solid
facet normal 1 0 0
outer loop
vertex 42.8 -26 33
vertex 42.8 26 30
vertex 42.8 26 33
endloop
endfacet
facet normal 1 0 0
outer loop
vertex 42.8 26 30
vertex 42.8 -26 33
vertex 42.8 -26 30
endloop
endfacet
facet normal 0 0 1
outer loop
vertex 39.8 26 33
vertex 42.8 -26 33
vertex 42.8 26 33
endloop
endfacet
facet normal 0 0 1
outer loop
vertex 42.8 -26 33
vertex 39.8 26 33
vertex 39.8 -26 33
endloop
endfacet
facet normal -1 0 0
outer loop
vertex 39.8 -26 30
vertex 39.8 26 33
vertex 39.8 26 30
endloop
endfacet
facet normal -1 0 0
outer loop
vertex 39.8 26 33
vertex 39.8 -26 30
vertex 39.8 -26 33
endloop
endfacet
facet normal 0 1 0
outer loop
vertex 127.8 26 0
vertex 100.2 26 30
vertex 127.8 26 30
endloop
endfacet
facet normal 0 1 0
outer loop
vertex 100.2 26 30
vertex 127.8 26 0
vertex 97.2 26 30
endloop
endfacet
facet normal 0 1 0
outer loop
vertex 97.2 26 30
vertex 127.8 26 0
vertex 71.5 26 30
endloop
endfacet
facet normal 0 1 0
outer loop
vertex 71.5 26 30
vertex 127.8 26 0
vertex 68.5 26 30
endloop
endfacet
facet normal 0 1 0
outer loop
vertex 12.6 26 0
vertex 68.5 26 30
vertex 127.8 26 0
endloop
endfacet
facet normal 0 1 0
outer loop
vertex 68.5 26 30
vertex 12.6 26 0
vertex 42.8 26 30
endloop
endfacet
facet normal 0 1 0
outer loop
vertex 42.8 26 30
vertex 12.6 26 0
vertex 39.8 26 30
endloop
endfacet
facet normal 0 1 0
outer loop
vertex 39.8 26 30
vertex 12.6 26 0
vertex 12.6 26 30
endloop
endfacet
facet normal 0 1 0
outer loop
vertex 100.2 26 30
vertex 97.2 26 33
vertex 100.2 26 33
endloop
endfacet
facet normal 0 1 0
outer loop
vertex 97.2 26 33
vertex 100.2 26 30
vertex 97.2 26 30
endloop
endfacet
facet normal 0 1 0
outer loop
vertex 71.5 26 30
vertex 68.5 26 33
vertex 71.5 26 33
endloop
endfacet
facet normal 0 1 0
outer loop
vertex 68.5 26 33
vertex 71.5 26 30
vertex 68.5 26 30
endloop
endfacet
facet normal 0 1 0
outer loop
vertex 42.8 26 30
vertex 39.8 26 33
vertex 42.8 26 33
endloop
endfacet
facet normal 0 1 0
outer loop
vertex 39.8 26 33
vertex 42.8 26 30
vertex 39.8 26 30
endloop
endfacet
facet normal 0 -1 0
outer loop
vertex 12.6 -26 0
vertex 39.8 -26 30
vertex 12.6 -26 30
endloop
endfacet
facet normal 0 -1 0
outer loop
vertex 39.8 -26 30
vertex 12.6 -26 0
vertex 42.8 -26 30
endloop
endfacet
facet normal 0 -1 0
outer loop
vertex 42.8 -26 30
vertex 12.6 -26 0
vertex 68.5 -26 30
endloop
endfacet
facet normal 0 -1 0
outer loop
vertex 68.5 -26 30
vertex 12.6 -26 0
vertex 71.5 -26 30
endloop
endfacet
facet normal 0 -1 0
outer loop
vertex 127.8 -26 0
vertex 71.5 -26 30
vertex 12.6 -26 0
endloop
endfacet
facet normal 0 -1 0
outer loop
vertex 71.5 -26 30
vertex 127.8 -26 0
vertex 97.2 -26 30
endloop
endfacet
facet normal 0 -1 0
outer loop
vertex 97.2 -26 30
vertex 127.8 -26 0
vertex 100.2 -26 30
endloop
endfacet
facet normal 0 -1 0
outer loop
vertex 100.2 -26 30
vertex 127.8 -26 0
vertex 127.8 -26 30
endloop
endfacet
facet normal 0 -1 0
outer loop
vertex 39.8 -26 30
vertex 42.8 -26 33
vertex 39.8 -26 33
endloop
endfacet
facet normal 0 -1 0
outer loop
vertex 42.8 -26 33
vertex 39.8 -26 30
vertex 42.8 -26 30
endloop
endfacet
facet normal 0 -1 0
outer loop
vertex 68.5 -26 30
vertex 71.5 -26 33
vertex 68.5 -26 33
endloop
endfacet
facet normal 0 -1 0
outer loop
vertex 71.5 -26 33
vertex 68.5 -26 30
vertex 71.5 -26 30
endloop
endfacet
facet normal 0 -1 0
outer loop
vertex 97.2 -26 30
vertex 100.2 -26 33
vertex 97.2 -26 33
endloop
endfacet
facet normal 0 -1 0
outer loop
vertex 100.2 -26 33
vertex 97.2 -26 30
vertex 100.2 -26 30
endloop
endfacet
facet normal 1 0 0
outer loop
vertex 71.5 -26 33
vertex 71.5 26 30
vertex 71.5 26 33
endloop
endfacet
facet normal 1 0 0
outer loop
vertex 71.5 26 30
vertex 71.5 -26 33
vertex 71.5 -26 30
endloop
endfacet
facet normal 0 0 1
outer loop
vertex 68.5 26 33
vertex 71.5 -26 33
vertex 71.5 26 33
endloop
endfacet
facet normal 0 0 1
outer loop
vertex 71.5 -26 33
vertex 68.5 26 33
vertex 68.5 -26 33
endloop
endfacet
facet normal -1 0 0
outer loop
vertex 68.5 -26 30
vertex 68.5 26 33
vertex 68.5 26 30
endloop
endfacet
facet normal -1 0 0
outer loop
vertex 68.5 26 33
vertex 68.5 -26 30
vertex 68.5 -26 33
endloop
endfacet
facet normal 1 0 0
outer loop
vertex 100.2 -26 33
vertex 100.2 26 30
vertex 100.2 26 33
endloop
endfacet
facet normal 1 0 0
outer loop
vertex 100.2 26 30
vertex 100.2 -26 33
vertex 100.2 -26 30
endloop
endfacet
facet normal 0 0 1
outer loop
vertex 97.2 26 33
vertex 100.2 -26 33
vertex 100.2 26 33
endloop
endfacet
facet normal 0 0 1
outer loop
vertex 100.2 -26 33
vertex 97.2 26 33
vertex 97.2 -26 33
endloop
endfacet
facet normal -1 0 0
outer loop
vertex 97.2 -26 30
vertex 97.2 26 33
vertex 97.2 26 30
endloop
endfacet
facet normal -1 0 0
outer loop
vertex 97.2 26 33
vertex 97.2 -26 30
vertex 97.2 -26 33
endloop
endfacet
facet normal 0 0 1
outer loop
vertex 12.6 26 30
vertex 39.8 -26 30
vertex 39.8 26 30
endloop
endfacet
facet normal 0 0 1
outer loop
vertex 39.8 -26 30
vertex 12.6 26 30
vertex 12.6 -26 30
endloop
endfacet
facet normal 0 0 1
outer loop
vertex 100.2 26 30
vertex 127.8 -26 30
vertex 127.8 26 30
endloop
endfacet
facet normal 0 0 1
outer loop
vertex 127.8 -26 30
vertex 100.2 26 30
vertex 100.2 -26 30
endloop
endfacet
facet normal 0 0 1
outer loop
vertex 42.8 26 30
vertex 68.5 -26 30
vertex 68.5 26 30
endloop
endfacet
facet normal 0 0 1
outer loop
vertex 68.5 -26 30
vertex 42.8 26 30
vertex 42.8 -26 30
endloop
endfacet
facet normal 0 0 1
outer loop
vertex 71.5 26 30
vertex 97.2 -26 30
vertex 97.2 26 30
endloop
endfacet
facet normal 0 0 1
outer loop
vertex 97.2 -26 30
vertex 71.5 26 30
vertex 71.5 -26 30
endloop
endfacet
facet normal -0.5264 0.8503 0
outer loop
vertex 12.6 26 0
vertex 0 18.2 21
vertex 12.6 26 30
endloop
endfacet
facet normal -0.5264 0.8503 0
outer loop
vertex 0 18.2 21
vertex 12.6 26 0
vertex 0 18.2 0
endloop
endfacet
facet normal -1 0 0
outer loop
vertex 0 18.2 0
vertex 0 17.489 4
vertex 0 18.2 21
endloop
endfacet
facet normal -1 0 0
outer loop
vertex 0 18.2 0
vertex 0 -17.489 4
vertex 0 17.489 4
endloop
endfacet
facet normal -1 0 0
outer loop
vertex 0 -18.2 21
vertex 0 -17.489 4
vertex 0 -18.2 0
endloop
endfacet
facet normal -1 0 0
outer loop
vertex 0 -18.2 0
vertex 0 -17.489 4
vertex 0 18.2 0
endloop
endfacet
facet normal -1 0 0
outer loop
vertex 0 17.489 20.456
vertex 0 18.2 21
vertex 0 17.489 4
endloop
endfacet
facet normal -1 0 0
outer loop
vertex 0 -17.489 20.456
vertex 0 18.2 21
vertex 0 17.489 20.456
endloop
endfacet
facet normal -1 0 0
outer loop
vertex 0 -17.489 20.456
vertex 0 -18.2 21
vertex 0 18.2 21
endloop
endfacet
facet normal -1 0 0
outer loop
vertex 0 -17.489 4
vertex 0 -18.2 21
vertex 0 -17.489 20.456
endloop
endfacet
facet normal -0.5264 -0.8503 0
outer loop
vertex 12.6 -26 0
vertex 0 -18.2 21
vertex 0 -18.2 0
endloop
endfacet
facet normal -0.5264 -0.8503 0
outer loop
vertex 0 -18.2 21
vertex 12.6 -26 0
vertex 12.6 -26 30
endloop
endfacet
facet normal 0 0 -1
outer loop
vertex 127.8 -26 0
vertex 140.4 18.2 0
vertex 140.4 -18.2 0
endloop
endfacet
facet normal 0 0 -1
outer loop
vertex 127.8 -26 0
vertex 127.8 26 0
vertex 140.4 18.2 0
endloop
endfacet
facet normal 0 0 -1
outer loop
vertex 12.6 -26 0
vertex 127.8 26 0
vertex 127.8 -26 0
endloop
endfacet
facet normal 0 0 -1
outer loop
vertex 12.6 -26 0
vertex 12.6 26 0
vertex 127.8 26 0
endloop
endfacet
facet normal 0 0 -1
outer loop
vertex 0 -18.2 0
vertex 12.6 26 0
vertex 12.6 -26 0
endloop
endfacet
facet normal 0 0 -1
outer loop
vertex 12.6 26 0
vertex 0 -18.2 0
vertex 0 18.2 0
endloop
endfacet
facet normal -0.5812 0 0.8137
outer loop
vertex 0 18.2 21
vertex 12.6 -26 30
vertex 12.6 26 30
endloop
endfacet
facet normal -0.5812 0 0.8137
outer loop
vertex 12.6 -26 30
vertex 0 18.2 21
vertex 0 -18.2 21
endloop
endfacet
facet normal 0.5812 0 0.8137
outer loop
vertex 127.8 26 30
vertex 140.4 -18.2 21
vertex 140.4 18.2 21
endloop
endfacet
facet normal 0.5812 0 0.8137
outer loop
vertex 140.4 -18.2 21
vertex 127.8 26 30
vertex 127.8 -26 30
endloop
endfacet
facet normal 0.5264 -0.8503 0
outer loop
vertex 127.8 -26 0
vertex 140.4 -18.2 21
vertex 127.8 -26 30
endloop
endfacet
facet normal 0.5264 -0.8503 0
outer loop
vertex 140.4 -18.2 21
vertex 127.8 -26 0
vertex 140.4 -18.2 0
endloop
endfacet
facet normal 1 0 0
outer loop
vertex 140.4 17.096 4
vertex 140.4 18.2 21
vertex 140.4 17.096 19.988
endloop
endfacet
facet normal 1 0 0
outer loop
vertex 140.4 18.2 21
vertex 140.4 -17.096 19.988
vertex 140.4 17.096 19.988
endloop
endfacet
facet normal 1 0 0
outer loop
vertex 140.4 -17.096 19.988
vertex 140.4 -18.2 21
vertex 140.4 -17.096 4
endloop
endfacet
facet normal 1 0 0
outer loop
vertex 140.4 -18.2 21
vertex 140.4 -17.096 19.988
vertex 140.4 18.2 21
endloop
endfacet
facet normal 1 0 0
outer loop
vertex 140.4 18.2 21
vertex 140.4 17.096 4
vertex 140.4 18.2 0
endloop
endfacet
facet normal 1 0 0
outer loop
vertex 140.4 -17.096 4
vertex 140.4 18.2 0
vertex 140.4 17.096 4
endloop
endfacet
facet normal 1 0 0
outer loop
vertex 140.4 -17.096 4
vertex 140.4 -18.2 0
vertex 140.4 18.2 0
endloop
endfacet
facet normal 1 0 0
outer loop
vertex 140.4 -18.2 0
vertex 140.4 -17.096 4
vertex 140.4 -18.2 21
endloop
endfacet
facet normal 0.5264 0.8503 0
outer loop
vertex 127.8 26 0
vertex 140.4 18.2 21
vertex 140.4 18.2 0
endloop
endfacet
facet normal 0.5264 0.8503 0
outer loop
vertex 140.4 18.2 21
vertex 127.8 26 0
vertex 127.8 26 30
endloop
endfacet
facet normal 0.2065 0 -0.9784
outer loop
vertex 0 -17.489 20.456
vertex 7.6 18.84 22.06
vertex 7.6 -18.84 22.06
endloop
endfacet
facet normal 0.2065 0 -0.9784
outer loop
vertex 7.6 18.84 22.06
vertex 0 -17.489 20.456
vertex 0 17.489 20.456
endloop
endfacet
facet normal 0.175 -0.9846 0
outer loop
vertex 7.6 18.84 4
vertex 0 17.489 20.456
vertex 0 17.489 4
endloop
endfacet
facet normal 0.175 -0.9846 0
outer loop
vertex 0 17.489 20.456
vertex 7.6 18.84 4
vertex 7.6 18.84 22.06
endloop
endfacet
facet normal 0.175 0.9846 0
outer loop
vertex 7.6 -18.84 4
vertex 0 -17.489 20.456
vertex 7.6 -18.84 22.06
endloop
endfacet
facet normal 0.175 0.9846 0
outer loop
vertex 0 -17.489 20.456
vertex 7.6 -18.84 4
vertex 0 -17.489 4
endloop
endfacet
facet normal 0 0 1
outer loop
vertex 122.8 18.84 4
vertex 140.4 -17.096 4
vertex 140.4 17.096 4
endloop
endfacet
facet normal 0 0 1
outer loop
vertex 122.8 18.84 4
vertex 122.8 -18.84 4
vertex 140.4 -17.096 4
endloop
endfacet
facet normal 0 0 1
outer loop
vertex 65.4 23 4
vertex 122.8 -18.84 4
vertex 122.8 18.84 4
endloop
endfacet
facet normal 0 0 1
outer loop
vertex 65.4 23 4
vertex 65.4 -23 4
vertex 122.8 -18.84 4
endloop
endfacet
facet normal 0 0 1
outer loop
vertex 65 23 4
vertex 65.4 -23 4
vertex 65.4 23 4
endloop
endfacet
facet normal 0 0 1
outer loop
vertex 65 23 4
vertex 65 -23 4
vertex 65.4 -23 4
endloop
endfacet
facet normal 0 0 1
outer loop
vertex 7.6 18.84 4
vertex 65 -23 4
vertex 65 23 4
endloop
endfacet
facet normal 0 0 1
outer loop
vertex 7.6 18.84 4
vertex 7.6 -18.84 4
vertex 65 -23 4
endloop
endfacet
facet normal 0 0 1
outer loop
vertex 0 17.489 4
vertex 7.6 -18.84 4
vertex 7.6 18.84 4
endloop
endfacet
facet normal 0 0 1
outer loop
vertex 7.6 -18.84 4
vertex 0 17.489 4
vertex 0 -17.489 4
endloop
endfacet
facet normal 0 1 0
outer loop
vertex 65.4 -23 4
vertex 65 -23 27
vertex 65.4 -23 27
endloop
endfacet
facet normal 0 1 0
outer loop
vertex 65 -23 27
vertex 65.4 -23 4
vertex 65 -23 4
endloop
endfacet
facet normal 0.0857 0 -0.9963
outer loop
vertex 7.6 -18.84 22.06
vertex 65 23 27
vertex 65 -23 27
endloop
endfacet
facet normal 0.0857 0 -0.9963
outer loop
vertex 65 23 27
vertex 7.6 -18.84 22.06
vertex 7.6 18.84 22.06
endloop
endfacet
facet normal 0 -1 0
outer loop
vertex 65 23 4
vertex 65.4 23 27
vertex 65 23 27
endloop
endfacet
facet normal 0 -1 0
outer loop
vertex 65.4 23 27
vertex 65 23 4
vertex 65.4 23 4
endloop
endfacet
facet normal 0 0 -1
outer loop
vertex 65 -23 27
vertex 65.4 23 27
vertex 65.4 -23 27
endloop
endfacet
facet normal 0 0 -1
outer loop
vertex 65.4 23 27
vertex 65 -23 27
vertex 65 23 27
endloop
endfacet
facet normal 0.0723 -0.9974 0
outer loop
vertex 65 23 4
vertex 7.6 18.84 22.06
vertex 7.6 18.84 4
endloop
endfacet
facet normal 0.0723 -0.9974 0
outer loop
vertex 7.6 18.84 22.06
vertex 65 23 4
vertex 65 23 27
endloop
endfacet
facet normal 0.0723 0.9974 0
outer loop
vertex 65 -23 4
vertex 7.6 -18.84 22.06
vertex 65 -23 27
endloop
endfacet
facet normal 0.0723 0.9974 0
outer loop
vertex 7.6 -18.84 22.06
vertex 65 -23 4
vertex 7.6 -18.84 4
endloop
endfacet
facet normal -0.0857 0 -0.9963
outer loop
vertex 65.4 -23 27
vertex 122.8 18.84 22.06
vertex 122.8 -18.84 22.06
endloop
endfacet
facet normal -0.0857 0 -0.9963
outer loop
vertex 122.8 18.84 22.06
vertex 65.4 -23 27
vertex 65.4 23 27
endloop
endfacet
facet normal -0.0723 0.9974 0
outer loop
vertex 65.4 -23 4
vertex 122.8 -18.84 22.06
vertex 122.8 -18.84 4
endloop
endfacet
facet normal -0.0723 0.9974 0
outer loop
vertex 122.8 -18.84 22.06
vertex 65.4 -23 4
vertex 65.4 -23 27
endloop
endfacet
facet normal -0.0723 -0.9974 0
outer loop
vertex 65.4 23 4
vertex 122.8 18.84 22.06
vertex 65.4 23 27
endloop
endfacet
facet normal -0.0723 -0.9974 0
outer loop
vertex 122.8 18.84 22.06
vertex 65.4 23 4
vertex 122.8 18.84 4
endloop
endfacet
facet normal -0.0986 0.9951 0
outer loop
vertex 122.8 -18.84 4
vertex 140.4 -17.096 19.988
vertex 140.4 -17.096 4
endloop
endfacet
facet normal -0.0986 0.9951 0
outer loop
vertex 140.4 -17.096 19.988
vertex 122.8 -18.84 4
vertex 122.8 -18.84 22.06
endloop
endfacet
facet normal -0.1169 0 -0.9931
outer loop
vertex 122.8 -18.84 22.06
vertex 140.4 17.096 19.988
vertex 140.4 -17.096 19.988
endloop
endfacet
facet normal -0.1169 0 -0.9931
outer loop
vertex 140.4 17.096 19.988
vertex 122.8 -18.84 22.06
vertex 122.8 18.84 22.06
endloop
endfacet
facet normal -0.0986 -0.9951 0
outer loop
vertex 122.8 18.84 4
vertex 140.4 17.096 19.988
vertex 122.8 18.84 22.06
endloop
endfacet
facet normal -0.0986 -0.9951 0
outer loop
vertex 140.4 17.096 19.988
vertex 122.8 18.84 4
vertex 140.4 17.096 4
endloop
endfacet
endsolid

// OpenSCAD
$fn = 32;

// ----------------------------------------------------------------------
// Faired channel: 140 x 52 x 30 mm, 3 mm walls, faired ends
// ----------------------------------------------------------------------

// --- parameters (mm) ---
length = 140;             // channel length
width = 52;               // channel width at mid length
height = 30;              // channel height at mid length
wall = 3;                 // side wall thickness
floor_t = 4;              // floor thickness
end_w = 36.4;             // faired end width
end_h = 21;               // faired end height
ribs = 3;                 // stiffening ribs on the top
rib_t = 3;                // rib thickness
rib_h = 3;                // rib height

difference() {
  union() {
    hull() {
      translate([0, -18.2, 0]) cube([0.4, 36.4, 21]);
      translate([12.6, -26, 0]) cube([0.4, 52, 30]);
    }
    hull() {
      translate([12.6, -26, 0]) cube([0.4, 52, 30]);
      translate([70, -26, 0]) cube([0.4, 52, 30]);
    }
    hull() {
      translate([70, -26, 0]) cube([0.4, 52, 30]);
      translate([127.4, -26, 0]) cube([0.4, 52, 30]);
    }
    hull() {
      translate([127.4, -26, 0]) cube([0.4, 52, 30]);
      translate([140, -18.2, 0]) cube([0.4, 36.4, 21]);
    }
    /* stiffening ribs across the flat top, sunk 0.8 mm into it */
    for (i = [1 : ribs]) {
      translate([12.6 + i * (length - 2 * 12.6) / (ribs + 1) - rib_t / 2, -width / 2, height - 0.8]) cube([rib_t, width, rib_h + 0.8]);
    }
  }
  /* cavity, 5 mm proud of both ends so the ports are cut clean */
  hull() {
    translate([-5, -16.6, 4]) cube([0.4, 33.2, 15.4]);
    translate([7.6, -18.84, 4]) cube([0.4, 37.68, 18.06]);
  }
  hull() {
    translate([7.6, -18.84, 4]) cube([0.4, 37.68, 18.06]);
    translate([65, -23, 4]) cube([0.4, 46, 23]);
  }
  hull() {
    translate([65, -23, 4]) cube([0.4, 46, 23]);
    translate([122.4, -18.84, 4]) cube([0.4, 37.68, 18.06]);
  }
  hull() {
    translate([122.4, -18.84, 4]) cube([0.4, 37.68, 18.06]);
    translate([145, -16.6, 4]) cube([0.4, 33.2, 15.4]);
  }
}
